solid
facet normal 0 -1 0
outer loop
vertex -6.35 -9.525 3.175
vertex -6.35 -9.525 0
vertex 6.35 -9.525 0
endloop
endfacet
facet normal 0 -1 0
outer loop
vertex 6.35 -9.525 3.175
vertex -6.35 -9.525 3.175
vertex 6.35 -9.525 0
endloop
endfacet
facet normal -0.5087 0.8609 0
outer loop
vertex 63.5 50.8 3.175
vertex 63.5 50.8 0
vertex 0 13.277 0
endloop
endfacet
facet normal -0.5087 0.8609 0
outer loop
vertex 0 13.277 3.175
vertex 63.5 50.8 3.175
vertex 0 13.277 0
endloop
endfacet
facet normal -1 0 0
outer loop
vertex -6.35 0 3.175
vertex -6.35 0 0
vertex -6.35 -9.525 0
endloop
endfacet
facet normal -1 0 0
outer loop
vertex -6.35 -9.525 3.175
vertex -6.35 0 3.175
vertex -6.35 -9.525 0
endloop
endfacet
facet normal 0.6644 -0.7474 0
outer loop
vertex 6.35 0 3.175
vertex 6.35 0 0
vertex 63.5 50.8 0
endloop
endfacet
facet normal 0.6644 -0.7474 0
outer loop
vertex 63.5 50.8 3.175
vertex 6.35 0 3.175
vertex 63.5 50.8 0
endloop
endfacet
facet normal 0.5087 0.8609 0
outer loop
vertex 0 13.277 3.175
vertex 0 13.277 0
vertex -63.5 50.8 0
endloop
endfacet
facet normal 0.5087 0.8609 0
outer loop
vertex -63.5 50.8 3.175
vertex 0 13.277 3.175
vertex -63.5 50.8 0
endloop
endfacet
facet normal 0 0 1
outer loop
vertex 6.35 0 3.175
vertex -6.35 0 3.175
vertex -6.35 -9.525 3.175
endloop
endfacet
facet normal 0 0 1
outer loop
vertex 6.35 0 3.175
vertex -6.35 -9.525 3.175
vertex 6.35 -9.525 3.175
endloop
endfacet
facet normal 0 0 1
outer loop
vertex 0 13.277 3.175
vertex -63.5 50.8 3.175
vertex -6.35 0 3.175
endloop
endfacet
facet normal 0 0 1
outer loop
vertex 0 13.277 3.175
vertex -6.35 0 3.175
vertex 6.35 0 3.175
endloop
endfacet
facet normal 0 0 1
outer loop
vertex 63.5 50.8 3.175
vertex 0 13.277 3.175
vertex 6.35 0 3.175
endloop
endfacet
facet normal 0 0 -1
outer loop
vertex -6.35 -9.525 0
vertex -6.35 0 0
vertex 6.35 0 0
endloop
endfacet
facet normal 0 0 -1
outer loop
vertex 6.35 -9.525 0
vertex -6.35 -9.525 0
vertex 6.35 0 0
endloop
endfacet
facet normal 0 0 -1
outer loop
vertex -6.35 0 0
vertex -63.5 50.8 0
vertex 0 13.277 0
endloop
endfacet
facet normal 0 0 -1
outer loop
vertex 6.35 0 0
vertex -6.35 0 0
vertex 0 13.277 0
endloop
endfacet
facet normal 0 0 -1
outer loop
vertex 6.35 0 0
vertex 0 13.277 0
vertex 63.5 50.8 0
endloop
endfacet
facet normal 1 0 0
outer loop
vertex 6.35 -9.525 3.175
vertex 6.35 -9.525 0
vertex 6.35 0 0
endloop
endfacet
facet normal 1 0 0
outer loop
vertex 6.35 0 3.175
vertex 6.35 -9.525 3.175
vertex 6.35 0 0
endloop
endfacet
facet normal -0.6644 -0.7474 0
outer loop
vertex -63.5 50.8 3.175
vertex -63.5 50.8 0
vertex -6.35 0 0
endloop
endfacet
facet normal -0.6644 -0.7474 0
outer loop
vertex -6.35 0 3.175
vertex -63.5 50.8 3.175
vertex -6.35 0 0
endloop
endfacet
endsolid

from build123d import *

# Parameters (mm, degrees)
F0_W     = 6.35
F0_H     = 9.525
F1_DEPTH = 3.175


with BuildPart() as f1:
    # F0 (on Top) → F1 (new body)
    with BuildSketch(Plane.XY):
        Polygon((6.35, 9.525), (6.35, 0), (63.5, 50.8), (0, 13.277273), align=None)
        Polygon((-63.5, 50.8), (-6.35, 0), (-6.35, 9.525), (0, 13.277273), align=None)
        Polygon((0, 13.277273), (-6.35, 9.525), (0, 9.525), align=None)
        Polygon((0, 9.525), (6.35, 9.525), (0, 13.277273), align=None)
        with Locations((-3.175, 4.7625)):
            Rectangle(F0_W, F0_H)
        with Locations((3.175, 4.7625)):
            Rectangle(F0_W, F0_H)
        Polygon((-6.35, -9.525), (6.35, -9.525), (6.35, 0), (0, 0), (-6.35, 0), align=None)
    extrude(amount=F1_DEPTH)


solid = f1.part
